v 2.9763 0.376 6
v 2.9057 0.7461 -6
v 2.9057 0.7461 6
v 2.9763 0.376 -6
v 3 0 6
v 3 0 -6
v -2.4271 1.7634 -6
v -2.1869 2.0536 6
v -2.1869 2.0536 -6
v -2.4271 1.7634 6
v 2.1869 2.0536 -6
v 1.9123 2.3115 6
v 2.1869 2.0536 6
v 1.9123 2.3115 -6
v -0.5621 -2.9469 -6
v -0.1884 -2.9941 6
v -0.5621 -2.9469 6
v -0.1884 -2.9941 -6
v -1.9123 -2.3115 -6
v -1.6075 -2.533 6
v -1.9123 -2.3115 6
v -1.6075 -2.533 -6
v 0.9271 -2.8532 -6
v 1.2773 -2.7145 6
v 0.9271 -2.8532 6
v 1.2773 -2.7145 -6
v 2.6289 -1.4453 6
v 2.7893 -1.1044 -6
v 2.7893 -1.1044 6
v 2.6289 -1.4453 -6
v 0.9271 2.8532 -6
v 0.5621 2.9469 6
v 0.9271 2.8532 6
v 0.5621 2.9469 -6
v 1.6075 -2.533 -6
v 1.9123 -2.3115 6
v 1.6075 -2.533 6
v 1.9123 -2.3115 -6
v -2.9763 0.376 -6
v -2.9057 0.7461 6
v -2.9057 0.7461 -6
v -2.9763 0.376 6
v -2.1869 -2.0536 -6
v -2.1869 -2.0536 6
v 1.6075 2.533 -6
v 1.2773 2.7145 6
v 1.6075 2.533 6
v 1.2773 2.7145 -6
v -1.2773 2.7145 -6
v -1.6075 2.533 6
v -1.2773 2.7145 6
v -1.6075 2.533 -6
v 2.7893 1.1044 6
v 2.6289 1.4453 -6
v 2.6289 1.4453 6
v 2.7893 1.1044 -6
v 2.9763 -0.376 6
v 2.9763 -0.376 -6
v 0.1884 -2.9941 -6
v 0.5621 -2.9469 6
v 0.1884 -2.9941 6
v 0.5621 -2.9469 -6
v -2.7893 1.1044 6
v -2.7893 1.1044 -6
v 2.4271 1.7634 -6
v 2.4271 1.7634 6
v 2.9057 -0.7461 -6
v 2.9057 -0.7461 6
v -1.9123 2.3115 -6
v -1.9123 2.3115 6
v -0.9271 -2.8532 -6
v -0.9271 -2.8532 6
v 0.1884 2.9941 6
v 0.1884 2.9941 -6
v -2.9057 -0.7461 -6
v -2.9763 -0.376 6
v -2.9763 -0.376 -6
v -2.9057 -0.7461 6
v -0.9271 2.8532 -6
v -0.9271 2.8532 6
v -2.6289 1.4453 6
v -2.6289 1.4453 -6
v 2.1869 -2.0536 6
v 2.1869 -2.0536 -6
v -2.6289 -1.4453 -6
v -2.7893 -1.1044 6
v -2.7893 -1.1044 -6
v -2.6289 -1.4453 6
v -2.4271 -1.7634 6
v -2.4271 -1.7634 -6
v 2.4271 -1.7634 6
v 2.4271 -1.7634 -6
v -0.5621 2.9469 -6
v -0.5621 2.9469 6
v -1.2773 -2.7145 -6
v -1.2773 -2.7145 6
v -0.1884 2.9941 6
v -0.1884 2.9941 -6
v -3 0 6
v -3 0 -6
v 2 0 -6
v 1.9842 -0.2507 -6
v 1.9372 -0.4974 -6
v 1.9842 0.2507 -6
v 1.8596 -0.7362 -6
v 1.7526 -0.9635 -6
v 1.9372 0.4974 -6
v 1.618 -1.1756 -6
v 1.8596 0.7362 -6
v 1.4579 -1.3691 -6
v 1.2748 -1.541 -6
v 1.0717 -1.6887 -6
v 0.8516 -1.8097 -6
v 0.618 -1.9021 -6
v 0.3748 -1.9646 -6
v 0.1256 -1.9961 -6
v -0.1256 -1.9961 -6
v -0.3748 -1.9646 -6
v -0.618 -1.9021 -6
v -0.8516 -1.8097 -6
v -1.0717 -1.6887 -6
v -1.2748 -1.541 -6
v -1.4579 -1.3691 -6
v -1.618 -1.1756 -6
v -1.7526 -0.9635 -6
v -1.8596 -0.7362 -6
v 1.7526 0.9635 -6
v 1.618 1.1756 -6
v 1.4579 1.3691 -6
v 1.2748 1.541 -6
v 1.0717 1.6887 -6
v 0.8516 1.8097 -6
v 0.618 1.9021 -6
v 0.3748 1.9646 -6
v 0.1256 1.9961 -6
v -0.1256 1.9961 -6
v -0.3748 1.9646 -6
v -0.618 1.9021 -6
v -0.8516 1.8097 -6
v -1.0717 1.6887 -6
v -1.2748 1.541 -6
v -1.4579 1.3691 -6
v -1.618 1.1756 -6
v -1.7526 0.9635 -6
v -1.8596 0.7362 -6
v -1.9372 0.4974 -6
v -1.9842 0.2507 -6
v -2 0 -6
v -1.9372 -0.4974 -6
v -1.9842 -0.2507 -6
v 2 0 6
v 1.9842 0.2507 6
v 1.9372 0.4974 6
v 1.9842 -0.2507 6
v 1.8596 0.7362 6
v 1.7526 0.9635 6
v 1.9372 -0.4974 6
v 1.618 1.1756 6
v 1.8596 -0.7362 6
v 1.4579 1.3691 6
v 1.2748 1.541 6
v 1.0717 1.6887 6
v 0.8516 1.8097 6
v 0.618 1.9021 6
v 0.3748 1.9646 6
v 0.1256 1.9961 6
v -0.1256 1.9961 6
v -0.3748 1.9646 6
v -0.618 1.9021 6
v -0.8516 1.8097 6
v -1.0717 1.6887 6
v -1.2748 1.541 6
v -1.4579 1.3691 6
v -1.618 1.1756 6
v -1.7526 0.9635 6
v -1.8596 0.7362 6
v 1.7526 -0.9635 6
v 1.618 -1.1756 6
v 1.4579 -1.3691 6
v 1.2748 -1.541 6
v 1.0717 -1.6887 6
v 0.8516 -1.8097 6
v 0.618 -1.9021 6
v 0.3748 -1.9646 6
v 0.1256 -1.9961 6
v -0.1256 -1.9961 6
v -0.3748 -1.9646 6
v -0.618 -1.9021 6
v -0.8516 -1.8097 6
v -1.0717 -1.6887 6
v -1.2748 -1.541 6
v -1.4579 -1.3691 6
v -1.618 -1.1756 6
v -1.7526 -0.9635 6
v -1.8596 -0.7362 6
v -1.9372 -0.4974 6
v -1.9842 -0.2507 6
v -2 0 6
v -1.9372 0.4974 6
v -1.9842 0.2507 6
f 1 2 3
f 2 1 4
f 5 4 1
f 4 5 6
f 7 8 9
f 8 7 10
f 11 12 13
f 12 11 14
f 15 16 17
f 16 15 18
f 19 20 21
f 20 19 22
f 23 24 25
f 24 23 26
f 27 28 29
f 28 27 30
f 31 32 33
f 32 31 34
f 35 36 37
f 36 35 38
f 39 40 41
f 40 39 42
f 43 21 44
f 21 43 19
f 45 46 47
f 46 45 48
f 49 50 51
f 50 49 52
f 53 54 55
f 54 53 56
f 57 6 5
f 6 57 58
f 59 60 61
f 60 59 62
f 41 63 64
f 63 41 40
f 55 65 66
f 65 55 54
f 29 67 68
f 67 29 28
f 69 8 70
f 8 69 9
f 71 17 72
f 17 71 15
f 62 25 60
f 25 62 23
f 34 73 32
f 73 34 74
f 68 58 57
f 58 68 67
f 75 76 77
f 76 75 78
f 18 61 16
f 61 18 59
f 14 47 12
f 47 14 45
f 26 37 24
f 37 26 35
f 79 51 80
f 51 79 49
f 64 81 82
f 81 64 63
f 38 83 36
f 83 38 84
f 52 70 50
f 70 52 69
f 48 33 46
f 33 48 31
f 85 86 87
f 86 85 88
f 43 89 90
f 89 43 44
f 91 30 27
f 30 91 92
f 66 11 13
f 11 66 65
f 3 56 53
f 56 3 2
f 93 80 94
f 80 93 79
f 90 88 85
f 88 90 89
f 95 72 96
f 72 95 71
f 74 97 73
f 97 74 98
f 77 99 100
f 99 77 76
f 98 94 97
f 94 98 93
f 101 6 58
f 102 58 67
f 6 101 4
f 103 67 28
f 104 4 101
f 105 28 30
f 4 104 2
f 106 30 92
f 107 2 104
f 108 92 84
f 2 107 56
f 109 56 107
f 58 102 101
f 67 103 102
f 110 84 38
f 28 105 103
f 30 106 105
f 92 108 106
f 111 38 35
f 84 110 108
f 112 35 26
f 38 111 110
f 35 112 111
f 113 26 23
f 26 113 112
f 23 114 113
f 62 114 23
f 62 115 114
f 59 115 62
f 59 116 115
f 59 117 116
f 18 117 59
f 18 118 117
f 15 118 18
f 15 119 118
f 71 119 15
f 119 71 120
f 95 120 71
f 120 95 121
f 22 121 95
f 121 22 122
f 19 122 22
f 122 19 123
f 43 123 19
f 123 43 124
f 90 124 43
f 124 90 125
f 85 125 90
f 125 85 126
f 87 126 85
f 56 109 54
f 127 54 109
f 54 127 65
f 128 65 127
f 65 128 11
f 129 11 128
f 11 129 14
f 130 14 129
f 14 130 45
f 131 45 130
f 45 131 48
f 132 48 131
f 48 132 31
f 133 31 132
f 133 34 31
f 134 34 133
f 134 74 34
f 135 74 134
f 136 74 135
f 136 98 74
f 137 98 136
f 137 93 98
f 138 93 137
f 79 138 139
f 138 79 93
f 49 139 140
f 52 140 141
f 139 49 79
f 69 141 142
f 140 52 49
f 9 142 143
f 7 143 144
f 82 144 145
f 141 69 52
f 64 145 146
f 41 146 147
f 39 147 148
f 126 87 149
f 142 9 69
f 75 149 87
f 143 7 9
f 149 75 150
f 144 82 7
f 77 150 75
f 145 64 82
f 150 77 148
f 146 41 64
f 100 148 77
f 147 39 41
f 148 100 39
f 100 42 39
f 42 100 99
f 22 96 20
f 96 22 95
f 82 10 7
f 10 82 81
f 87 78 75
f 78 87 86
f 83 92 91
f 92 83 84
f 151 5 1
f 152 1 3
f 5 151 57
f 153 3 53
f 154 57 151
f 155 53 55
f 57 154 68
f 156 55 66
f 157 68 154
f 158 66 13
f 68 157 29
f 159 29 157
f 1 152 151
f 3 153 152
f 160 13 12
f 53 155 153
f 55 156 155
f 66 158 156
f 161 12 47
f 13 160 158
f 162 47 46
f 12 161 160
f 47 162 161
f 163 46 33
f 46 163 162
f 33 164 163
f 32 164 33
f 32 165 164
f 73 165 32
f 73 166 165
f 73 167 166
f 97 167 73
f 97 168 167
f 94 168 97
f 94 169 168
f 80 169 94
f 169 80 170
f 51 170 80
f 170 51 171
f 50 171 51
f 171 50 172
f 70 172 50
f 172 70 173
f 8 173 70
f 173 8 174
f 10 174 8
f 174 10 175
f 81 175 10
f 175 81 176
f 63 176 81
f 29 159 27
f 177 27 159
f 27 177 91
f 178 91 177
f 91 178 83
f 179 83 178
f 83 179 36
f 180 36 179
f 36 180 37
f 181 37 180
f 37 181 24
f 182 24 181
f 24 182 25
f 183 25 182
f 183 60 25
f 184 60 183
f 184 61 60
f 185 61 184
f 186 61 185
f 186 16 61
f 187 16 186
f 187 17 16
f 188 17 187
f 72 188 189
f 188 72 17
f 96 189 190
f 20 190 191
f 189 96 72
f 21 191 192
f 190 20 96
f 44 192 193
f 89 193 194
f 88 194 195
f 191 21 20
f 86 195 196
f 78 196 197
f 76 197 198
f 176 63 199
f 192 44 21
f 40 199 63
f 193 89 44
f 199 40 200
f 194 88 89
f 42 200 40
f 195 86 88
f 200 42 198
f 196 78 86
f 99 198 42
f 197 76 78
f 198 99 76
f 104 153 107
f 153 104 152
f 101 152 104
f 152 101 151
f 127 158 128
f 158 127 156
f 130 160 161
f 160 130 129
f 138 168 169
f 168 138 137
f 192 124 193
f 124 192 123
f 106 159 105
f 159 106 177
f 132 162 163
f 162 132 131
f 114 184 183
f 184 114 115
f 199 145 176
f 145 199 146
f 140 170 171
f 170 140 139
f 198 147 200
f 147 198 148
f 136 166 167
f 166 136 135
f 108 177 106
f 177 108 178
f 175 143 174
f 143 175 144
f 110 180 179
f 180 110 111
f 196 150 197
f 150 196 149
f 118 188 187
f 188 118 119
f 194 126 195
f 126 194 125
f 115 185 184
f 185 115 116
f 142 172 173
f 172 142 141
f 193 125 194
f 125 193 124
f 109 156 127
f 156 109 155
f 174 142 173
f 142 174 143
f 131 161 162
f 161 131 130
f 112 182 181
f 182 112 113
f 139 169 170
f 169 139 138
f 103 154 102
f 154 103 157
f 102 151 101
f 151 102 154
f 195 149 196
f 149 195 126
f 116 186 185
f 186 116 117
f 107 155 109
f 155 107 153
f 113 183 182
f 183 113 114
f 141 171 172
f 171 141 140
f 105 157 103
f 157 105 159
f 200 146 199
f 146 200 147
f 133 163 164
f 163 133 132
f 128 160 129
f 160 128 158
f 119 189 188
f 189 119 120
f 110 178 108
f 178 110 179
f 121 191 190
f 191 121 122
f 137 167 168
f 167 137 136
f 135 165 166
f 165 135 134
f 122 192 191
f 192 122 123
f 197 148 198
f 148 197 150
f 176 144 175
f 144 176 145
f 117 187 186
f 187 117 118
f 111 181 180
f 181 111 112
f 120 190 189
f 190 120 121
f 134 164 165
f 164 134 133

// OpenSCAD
$fn = 50;


difference() {
	union() {
		translate(v = [0, 0, -6.0000000000]) {
			cylinder(h = 12, r = 3.0000000000);
		}
	}
	union() {
		translate(v = [0, 0, -100.0000000000]) {
			cylinder(h = 200, r = 2.0000000000);
		}
	}
}
